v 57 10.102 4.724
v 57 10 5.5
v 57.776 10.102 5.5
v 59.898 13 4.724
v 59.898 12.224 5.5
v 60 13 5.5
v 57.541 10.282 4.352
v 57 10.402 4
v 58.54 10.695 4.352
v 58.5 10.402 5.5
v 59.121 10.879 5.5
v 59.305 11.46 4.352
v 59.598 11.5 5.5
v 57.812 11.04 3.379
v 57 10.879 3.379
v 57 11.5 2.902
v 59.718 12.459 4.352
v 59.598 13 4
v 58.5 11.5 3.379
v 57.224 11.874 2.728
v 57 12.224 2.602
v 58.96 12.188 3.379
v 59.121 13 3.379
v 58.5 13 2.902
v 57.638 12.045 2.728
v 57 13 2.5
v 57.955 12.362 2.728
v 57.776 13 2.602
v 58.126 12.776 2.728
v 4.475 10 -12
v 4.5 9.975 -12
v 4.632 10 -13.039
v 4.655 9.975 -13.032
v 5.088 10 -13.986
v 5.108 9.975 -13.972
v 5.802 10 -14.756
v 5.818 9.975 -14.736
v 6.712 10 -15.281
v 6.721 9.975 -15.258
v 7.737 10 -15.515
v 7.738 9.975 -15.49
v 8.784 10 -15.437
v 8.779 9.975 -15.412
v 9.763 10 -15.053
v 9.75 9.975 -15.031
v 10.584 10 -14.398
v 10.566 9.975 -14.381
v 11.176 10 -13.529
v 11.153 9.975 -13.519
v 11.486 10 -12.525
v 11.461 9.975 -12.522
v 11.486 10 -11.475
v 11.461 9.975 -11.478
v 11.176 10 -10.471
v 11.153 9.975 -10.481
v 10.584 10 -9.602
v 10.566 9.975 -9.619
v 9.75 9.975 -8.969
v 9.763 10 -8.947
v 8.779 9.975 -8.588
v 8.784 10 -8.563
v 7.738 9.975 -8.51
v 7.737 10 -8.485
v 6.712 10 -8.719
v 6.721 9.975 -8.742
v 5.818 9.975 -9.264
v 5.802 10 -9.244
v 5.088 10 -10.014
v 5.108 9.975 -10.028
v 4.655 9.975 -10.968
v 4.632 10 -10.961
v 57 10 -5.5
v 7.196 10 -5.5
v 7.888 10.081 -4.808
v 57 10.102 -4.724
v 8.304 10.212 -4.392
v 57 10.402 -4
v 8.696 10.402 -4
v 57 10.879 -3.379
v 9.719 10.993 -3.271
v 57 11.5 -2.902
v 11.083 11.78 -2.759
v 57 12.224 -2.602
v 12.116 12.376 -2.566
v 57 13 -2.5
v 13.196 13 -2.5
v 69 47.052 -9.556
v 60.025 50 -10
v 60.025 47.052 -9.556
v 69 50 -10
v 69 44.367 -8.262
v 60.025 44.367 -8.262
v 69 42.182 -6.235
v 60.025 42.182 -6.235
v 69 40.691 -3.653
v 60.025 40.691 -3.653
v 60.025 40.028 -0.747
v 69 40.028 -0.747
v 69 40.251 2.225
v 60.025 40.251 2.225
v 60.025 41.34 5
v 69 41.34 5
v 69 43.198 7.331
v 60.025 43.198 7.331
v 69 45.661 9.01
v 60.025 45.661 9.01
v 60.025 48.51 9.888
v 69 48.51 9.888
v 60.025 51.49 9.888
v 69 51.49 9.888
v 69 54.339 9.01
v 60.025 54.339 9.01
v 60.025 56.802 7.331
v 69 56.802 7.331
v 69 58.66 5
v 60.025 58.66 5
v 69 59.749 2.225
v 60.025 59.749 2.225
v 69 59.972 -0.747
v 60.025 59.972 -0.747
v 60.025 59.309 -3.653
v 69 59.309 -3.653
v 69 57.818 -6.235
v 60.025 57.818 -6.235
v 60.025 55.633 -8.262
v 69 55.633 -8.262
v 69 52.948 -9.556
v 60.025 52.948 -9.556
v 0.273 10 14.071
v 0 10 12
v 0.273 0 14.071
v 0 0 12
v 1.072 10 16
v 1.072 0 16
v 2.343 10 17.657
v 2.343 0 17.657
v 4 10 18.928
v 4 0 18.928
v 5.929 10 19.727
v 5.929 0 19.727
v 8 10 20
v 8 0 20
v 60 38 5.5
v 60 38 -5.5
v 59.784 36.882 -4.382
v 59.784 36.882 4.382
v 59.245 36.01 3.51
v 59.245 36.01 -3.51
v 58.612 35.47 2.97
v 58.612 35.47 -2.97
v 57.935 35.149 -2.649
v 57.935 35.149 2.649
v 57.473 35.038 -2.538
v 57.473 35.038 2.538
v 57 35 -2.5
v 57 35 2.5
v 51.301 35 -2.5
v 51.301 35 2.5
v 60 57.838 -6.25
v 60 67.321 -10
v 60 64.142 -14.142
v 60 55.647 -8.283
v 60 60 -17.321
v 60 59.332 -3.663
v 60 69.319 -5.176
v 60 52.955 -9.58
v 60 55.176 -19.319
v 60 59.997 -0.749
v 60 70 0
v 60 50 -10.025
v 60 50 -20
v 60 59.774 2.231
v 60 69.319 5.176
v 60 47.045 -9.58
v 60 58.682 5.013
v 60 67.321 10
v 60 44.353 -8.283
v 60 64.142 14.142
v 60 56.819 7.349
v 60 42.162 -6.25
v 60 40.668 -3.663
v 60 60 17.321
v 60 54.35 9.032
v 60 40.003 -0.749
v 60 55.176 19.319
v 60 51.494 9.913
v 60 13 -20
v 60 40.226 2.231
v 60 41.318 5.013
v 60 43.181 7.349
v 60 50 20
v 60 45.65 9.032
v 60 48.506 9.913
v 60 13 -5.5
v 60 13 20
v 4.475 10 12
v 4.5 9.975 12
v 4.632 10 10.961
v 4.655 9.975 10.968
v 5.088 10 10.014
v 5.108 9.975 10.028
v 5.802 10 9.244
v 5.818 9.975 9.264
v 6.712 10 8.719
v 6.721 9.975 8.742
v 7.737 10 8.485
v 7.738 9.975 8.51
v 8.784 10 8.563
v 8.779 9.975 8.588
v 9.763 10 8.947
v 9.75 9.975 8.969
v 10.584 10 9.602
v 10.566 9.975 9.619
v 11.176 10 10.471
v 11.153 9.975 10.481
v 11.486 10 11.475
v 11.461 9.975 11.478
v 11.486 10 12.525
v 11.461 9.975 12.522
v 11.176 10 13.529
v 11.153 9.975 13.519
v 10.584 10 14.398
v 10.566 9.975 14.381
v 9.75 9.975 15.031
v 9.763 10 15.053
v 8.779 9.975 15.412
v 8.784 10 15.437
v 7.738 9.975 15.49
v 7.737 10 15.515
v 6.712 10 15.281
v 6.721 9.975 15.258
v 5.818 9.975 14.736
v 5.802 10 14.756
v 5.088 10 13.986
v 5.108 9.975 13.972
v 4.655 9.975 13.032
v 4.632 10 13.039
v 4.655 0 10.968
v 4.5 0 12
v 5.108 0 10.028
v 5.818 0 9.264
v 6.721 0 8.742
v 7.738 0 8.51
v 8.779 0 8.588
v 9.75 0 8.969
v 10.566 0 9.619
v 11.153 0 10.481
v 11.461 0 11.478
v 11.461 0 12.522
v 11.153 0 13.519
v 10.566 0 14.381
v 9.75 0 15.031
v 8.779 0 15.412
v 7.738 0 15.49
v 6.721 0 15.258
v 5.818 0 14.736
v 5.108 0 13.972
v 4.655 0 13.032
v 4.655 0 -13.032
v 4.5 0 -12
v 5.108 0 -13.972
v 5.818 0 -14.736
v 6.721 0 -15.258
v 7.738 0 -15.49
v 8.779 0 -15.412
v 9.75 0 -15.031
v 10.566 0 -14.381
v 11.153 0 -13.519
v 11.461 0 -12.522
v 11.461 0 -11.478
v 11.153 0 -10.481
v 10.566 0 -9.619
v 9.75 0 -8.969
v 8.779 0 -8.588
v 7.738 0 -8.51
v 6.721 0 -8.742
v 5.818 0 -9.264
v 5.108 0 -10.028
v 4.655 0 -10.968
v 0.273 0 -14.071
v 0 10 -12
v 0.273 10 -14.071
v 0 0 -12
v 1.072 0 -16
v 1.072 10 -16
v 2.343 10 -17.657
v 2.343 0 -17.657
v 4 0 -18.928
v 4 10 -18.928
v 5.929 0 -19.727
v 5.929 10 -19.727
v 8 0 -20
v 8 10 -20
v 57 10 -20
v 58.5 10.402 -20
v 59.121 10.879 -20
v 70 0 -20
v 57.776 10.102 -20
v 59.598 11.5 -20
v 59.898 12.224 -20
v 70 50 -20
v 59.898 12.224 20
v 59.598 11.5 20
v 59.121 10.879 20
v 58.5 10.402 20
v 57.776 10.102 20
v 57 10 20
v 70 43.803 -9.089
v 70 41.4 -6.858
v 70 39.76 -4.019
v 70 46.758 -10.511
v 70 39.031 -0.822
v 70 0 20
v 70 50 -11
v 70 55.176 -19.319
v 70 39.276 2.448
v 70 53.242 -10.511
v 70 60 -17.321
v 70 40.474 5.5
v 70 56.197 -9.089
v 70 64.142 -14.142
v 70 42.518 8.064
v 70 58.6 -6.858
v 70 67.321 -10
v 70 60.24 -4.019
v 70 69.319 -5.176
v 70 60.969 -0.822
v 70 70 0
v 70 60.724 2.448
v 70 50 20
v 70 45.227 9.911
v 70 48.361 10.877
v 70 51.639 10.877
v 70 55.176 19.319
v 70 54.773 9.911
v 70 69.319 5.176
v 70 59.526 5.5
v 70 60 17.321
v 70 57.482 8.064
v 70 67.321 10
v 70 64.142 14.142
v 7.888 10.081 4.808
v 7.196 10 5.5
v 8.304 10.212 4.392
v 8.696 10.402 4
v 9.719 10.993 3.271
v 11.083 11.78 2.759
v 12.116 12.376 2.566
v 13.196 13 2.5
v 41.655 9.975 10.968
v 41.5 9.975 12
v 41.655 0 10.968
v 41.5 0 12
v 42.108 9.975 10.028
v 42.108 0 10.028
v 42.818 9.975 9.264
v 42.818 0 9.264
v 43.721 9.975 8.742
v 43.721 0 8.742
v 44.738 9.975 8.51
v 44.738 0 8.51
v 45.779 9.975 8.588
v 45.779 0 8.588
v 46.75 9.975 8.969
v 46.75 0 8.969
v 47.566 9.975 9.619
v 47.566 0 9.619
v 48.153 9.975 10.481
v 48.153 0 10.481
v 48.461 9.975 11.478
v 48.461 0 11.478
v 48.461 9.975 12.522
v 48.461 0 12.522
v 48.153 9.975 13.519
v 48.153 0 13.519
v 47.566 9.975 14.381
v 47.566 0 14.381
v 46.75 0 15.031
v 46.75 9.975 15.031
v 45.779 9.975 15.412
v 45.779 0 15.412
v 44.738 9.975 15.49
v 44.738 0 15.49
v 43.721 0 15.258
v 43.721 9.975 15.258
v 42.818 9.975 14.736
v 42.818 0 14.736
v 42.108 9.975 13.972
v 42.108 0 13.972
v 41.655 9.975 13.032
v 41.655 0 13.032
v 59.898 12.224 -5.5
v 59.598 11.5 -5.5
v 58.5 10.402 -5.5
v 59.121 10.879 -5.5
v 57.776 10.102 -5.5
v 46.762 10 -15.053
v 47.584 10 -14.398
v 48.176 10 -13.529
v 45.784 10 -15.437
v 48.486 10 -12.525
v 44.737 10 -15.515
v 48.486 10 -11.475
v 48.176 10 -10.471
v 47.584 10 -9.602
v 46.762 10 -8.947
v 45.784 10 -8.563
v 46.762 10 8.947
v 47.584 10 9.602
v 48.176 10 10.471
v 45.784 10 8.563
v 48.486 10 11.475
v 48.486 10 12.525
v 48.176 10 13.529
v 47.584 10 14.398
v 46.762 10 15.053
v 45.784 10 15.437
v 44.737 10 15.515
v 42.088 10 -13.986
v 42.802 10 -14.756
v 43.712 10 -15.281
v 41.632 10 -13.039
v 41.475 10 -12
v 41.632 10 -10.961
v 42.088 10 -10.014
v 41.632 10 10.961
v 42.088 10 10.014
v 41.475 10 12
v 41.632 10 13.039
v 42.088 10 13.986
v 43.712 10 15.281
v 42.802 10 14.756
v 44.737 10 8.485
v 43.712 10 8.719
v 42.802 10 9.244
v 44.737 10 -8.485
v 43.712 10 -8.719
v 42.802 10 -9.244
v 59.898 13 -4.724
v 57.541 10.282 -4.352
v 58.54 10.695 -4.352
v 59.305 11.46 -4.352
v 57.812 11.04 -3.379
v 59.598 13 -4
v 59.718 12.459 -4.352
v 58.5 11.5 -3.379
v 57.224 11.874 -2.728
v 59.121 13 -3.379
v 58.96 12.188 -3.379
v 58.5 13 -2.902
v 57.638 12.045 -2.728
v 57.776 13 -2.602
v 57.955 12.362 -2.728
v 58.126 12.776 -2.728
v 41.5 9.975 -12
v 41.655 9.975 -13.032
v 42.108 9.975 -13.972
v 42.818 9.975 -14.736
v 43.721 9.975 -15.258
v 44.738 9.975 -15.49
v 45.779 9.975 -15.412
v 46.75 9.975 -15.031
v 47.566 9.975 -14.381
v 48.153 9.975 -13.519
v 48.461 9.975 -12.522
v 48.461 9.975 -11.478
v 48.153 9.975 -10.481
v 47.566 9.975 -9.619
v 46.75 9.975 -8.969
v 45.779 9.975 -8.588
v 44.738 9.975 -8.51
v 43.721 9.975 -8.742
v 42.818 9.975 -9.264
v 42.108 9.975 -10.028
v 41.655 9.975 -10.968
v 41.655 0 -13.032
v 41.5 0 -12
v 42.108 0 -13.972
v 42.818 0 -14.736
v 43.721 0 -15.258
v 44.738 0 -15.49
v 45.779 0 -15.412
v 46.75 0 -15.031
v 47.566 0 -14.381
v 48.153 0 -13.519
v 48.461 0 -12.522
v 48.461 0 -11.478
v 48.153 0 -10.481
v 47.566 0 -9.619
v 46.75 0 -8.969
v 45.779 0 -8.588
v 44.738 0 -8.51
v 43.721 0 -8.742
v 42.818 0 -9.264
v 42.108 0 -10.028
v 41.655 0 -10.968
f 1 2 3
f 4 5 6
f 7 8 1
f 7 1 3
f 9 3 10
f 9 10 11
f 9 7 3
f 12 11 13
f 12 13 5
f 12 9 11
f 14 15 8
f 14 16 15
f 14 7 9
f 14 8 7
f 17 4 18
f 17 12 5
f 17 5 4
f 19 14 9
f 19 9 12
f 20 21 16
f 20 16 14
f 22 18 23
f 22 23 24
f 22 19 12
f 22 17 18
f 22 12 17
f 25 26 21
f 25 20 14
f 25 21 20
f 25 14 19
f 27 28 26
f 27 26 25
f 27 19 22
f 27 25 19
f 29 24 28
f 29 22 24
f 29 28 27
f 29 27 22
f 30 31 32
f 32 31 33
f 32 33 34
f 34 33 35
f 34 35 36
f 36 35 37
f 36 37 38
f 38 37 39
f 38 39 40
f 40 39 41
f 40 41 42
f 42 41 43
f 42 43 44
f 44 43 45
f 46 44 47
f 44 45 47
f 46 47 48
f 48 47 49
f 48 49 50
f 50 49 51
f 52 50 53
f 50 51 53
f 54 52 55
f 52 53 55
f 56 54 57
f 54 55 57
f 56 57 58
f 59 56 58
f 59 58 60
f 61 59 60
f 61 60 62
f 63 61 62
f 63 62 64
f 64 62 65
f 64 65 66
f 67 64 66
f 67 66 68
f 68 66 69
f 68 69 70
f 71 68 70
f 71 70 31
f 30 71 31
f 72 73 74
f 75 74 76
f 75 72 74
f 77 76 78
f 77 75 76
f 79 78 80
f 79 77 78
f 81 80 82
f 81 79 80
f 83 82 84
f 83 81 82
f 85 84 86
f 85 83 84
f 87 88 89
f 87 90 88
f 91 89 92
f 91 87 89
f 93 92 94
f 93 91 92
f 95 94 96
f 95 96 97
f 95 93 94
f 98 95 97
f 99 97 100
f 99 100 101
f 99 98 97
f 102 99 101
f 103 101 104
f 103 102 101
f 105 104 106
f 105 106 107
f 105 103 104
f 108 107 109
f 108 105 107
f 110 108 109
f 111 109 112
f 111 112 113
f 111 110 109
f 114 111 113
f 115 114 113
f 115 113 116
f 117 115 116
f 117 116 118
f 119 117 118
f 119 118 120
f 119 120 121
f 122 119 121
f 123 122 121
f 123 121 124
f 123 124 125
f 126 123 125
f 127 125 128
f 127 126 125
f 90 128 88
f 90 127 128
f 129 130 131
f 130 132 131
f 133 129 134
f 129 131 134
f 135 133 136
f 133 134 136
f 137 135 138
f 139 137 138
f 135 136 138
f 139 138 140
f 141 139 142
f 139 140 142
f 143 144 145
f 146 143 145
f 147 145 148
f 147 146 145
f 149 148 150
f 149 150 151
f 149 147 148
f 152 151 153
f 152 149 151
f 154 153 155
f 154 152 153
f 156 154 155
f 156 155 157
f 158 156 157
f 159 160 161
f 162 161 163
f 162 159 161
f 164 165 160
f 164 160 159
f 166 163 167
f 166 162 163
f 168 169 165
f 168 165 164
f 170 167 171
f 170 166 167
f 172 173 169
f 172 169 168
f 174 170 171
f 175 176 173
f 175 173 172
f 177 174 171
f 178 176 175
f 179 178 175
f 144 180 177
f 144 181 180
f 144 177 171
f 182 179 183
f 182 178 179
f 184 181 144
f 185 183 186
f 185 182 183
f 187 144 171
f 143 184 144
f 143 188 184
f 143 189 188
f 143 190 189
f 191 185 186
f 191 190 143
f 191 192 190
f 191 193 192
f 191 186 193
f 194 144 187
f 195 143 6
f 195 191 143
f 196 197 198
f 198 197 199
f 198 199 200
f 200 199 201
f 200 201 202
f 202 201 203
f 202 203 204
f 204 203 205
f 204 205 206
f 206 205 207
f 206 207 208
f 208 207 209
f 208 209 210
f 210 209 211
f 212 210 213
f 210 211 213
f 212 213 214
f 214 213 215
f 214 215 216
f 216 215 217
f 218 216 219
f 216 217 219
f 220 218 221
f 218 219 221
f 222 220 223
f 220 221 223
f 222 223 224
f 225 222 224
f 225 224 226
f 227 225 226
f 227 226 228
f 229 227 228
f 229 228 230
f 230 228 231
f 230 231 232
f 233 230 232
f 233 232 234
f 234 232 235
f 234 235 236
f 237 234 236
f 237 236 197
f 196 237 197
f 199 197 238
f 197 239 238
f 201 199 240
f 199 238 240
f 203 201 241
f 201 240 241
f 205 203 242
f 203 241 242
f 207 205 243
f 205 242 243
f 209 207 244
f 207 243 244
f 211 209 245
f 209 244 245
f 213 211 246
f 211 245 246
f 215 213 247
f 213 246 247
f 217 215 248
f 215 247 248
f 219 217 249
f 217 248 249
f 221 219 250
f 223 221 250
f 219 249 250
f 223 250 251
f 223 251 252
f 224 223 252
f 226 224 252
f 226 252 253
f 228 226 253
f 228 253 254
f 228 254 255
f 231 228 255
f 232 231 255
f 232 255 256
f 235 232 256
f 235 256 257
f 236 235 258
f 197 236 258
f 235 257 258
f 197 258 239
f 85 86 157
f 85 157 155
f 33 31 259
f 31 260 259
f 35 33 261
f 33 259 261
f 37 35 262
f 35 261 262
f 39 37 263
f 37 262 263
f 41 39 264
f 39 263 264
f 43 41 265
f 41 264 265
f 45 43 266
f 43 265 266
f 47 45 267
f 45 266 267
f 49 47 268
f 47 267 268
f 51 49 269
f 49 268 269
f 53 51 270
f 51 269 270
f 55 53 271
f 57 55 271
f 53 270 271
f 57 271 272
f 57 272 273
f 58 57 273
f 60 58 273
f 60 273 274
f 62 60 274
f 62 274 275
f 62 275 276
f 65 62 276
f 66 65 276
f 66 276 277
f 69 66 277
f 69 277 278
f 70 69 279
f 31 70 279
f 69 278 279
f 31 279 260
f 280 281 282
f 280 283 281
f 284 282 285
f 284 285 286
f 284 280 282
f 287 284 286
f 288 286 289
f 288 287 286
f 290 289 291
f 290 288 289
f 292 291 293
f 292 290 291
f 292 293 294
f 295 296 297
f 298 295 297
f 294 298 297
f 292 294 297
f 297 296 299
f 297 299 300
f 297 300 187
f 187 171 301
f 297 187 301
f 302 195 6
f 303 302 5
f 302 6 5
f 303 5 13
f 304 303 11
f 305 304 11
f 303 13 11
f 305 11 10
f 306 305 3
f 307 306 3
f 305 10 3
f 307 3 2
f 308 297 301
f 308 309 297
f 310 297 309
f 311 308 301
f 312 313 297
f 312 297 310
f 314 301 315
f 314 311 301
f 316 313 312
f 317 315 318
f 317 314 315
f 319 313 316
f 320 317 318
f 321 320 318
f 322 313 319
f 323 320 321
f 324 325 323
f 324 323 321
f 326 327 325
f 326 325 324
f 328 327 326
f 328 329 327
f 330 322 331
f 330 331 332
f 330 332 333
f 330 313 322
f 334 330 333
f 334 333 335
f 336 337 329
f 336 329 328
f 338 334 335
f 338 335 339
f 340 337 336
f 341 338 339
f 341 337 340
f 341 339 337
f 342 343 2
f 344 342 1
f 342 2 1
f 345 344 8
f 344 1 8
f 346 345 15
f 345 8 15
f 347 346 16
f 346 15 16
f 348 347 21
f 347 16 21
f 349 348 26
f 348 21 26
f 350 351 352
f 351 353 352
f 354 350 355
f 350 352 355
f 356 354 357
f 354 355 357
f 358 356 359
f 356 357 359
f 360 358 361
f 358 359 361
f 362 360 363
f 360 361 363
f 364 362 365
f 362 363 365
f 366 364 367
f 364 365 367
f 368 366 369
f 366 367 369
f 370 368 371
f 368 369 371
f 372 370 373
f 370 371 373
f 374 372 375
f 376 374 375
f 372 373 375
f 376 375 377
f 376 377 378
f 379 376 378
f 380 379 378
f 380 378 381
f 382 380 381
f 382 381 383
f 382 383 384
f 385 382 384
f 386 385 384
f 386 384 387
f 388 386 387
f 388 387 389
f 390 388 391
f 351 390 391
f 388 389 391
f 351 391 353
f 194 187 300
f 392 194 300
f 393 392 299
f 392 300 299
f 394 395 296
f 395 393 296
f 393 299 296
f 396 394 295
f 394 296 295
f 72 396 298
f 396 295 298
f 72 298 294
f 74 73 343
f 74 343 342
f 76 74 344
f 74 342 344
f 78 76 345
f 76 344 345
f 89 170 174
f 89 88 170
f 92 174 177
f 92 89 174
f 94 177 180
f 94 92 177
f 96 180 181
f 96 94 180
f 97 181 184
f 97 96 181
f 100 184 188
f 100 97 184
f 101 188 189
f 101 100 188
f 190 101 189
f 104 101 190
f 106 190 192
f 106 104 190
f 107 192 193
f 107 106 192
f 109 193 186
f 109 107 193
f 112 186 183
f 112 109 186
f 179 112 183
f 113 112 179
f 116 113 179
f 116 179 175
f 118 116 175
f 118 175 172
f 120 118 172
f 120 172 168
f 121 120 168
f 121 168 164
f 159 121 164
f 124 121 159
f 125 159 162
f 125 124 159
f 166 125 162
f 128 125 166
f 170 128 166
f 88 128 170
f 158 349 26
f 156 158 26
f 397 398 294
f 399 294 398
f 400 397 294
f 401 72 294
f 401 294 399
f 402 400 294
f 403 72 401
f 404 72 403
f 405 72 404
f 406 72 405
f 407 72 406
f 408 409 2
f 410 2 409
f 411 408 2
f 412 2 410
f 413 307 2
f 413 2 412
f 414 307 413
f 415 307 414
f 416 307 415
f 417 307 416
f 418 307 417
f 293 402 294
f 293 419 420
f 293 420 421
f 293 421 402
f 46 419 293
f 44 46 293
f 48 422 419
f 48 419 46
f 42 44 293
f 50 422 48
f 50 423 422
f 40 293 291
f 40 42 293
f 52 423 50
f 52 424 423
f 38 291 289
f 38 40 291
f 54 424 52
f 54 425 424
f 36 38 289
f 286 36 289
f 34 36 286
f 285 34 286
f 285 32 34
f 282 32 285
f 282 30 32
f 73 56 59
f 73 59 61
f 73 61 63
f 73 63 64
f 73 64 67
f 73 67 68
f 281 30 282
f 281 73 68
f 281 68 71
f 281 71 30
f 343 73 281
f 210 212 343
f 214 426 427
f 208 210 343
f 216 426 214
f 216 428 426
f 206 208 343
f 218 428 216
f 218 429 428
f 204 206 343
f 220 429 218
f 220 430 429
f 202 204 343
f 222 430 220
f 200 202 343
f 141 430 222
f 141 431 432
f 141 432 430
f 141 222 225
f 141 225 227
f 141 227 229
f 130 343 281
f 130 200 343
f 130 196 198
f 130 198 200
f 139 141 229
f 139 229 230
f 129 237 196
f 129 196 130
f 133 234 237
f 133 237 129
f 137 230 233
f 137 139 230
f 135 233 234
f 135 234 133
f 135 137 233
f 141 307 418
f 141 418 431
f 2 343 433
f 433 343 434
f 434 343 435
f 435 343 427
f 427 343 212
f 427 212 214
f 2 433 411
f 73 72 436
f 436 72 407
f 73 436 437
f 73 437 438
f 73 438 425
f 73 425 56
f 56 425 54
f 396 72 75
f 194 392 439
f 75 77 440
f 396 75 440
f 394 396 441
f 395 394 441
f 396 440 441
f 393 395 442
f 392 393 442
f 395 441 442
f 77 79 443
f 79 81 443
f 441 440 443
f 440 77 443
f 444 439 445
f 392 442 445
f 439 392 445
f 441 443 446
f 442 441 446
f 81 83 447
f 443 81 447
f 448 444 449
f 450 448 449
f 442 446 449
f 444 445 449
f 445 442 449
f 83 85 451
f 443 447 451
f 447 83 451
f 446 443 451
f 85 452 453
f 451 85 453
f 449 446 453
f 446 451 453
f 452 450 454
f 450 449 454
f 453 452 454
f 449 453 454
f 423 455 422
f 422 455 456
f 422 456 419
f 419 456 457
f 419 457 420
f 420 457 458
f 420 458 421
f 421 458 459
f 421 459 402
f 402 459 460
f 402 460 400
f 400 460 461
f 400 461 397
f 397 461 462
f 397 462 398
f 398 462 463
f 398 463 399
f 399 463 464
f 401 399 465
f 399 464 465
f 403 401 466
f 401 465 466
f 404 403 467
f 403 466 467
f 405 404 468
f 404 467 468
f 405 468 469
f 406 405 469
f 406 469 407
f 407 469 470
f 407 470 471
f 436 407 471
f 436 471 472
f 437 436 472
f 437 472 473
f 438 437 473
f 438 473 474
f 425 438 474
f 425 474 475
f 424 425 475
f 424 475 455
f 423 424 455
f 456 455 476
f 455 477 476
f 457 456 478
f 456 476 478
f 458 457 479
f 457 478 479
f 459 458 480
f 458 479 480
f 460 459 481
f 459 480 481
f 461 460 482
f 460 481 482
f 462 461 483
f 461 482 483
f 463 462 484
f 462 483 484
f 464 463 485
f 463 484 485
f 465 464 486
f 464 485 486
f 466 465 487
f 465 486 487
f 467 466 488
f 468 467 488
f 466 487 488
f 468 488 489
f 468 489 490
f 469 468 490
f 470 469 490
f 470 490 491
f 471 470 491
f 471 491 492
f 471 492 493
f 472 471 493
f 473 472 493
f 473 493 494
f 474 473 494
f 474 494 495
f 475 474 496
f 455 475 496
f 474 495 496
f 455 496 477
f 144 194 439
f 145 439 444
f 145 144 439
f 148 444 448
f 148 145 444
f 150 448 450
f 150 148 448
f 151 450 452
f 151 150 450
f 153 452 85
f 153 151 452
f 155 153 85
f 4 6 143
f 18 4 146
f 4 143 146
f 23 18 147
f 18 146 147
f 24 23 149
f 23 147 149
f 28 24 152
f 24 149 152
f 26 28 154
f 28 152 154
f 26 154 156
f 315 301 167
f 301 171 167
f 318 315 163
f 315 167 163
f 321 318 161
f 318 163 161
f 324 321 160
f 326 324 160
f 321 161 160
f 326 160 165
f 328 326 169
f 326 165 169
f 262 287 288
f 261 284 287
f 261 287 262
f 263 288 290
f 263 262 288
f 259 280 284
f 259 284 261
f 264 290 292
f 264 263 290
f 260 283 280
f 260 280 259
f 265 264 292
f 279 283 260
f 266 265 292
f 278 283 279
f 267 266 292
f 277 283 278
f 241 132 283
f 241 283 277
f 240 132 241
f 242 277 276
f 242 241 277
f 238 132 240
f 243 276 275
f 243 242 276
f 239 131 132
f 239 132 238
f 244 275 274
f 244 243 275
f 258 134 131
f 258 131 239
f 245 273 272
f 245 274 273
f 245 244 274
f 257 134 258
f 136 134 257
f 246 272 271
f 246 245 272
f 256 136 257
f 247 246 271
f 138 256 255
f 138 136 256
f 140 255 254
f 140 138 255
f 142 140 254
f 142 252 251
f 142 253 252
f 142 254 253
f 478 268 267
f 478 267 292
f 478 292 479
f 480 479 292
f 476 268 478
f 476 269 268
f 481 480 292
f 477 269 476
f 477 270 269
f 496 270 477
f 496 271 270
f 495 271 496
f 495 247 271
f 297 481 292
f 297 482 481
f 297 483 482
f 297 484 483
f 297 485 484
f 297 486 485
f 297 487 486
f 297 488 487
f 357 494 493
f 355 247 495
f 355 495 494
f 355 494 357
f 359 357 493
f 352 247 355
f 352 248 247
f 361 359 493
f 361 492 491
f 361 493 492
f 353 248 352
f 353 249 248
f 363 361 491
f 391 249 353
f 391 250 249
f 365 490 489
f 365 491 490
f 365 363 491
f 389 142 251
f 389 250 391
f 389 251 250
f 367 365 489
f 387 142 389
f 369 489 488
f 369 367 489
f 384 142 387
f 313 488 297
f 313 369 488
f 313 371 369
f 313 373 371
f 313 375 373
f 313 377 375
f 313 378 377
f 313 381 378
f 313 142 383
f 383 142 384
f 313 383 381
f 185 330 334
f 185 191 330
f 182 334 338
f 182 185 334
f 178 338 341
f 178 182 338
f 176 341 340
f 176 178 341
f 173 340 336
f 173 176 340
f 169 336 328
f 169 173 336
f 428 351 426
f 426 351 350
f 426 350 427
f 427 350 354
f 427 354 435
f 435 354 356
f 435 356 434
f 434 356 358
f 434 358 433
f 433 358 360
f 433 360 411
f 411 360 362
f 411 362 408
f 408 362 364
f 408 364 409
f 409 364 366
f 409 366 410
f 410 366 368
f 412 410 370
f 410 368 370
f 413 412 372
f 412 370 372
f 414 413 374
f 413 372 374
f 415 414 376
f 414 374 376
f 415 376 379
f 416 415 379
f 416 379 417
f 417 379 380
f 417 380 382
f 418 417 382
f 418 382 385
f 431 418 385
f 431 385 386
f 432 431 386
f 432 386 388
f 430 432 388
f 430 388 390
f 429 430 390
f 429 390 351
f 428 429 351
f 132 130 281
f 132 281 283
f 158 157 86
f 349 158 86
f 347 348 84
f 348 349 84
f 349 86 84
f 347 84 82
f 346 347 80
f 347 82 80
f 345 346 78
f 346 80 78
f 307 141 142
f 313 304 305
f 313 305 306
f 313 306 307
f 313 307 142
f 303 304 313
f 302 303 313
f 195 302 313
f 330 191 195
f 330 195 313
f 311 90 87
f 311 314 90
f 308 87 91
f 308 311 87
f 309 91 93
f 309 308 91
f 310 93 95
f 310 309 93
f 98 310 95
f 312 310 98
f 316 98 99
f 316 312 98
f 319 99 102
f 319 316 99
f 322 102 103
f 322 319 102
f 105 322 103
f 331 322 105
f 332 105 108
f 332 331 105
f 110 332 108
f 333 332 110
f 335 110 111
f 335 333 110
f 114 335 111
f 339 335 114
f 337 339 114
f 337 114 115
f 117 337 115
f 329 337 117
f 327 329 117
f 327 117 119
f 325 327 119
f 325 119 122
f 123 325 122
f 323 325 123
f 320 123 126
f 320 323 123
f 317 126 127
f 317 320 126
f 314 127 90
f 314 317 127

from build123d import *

# Parameters (mm, degrees)
RESSALTO_EXTRUS_O1_DEPTH             = 20
FILETE1_R                            = 8
FILETE2_R                            = 20
FILETE3_R                            = 3
NERVURA23_START                      = -2.5
NERVURA23_DEPTH                      = 5
FILETE4_R                            = 3
FURO_DE_DI_METRO_7_0_7_1_D           = 7
FURO_DE_DI_METRO_7_0_7_1_CSINK_D     = 7.05
FURO_DE_DI_METRO_7_0_7_1_CSINK_ANGLE = 90


# Read off the part's stored shape, not the designer's step: Nervura23
with BuildPart() as part:
    # Esboço1 → Ressalto-extrusão1 (new, symmetric)
    with BuildSketch(Plane.XY):
        Polygon((0, 0), (70, 0), (70, 70), (60, 70), (60, 10), (0, 10), align=None)
    extrude(amount=RESSALTO_EXTRUS_O1_DEPTH, both=True)

    # Filete1
    filete1_edges = [part.edges().sort_by_distance(p)[0] for p in [
        (0, 5, -20),
        (0, 5, 20),
    ]]
    fillet(filete1_edges, radius=FILETE1_R)

    # Filete2
    filete2_edges = [part.edges().sort_by_distance(p)[0] for p in [
        (65, 70, 20),
        (65, 70, -20),
    ]]
    fillet(filete2_edges, radius=FILETE2_R - 0.0001)  # a hair under: the kernel refuses the full size

    # Filete3
    filete3_edges = [part.edges().sort_by_distance(p)[0] for p in [
        (60, 10, 0),
    ]]
    fillet(filete3_edges, radius=FILETE3_R)

    # Nervura23 outline → Nervura23 (add)
    with BuildSketch(Plane.XY.offset(NERVURA23_START)):
        with BuildLine():
            Line((60, 35), (51.301270189, 35))
            Line((51.301270189, 35), (8, 10))
            Line((8, 10), (57, 10))
            ThreePointArc((57, 10), (59.121320344, 10.878679656), (60, 13))
            Line((60, 13), (60, 35))
        make_face()
    extrude(amount=NERVURA23_DEPTH)

    # Filete4
    filete4_edges = [part.edges().sort_by_distance(p)[0] for p in [
        (59.121320344, 10.878679656, -2.5),
        (59.121320344, 10.878679656, 2.5),
        (8, 10, 0),
        (60, 35, 0),
        (32.5, 10, -2.5),
        (60, 24, -2.5),
        (32.5, 10, 2.5),
        (60, 24, 2.5),
    ]]
    fillet(filete4_edges, radius=FILETE4_R)

    # Furo de diâmetro Ø7.0 (7)1 (through all)
    with Locations(Plane(origin=(0, 10, 0), x_dir=(1, 0, 0), z_dir=(0, 1, 0))):
        with Locations((8, 12), (8, -12), (45, 12), (45, -12)):
            CounterSinkHole(FURO_DE_DI_METRO_7_0_7_1_D / 2, FURO_DE_DI_METRO_7_0_7_1_CSINK_D / 2, counter_sink_angle=FURO_DE_DI_METRO_7_0_7_1_CSINK_ANGLE)

    # Esboço11 → Furo de diâmetro Ø20.0 (20)1 (revolve, cut)
    with BuildSketch(Plane(origin=(70, 50, 0), x_dir=(0, 0, -1), z_dir=(0, 1, 0))):
        Polygon((0, 0), (0, 10), (10.025, 10), (10, 9.975), (10, 1), (11, 0), align=None)
    revolve(axis=Axis((76.35, 50, 0), (-1, 0, 0)), mode=Mode.SUBTRACT)


solid = part.part
